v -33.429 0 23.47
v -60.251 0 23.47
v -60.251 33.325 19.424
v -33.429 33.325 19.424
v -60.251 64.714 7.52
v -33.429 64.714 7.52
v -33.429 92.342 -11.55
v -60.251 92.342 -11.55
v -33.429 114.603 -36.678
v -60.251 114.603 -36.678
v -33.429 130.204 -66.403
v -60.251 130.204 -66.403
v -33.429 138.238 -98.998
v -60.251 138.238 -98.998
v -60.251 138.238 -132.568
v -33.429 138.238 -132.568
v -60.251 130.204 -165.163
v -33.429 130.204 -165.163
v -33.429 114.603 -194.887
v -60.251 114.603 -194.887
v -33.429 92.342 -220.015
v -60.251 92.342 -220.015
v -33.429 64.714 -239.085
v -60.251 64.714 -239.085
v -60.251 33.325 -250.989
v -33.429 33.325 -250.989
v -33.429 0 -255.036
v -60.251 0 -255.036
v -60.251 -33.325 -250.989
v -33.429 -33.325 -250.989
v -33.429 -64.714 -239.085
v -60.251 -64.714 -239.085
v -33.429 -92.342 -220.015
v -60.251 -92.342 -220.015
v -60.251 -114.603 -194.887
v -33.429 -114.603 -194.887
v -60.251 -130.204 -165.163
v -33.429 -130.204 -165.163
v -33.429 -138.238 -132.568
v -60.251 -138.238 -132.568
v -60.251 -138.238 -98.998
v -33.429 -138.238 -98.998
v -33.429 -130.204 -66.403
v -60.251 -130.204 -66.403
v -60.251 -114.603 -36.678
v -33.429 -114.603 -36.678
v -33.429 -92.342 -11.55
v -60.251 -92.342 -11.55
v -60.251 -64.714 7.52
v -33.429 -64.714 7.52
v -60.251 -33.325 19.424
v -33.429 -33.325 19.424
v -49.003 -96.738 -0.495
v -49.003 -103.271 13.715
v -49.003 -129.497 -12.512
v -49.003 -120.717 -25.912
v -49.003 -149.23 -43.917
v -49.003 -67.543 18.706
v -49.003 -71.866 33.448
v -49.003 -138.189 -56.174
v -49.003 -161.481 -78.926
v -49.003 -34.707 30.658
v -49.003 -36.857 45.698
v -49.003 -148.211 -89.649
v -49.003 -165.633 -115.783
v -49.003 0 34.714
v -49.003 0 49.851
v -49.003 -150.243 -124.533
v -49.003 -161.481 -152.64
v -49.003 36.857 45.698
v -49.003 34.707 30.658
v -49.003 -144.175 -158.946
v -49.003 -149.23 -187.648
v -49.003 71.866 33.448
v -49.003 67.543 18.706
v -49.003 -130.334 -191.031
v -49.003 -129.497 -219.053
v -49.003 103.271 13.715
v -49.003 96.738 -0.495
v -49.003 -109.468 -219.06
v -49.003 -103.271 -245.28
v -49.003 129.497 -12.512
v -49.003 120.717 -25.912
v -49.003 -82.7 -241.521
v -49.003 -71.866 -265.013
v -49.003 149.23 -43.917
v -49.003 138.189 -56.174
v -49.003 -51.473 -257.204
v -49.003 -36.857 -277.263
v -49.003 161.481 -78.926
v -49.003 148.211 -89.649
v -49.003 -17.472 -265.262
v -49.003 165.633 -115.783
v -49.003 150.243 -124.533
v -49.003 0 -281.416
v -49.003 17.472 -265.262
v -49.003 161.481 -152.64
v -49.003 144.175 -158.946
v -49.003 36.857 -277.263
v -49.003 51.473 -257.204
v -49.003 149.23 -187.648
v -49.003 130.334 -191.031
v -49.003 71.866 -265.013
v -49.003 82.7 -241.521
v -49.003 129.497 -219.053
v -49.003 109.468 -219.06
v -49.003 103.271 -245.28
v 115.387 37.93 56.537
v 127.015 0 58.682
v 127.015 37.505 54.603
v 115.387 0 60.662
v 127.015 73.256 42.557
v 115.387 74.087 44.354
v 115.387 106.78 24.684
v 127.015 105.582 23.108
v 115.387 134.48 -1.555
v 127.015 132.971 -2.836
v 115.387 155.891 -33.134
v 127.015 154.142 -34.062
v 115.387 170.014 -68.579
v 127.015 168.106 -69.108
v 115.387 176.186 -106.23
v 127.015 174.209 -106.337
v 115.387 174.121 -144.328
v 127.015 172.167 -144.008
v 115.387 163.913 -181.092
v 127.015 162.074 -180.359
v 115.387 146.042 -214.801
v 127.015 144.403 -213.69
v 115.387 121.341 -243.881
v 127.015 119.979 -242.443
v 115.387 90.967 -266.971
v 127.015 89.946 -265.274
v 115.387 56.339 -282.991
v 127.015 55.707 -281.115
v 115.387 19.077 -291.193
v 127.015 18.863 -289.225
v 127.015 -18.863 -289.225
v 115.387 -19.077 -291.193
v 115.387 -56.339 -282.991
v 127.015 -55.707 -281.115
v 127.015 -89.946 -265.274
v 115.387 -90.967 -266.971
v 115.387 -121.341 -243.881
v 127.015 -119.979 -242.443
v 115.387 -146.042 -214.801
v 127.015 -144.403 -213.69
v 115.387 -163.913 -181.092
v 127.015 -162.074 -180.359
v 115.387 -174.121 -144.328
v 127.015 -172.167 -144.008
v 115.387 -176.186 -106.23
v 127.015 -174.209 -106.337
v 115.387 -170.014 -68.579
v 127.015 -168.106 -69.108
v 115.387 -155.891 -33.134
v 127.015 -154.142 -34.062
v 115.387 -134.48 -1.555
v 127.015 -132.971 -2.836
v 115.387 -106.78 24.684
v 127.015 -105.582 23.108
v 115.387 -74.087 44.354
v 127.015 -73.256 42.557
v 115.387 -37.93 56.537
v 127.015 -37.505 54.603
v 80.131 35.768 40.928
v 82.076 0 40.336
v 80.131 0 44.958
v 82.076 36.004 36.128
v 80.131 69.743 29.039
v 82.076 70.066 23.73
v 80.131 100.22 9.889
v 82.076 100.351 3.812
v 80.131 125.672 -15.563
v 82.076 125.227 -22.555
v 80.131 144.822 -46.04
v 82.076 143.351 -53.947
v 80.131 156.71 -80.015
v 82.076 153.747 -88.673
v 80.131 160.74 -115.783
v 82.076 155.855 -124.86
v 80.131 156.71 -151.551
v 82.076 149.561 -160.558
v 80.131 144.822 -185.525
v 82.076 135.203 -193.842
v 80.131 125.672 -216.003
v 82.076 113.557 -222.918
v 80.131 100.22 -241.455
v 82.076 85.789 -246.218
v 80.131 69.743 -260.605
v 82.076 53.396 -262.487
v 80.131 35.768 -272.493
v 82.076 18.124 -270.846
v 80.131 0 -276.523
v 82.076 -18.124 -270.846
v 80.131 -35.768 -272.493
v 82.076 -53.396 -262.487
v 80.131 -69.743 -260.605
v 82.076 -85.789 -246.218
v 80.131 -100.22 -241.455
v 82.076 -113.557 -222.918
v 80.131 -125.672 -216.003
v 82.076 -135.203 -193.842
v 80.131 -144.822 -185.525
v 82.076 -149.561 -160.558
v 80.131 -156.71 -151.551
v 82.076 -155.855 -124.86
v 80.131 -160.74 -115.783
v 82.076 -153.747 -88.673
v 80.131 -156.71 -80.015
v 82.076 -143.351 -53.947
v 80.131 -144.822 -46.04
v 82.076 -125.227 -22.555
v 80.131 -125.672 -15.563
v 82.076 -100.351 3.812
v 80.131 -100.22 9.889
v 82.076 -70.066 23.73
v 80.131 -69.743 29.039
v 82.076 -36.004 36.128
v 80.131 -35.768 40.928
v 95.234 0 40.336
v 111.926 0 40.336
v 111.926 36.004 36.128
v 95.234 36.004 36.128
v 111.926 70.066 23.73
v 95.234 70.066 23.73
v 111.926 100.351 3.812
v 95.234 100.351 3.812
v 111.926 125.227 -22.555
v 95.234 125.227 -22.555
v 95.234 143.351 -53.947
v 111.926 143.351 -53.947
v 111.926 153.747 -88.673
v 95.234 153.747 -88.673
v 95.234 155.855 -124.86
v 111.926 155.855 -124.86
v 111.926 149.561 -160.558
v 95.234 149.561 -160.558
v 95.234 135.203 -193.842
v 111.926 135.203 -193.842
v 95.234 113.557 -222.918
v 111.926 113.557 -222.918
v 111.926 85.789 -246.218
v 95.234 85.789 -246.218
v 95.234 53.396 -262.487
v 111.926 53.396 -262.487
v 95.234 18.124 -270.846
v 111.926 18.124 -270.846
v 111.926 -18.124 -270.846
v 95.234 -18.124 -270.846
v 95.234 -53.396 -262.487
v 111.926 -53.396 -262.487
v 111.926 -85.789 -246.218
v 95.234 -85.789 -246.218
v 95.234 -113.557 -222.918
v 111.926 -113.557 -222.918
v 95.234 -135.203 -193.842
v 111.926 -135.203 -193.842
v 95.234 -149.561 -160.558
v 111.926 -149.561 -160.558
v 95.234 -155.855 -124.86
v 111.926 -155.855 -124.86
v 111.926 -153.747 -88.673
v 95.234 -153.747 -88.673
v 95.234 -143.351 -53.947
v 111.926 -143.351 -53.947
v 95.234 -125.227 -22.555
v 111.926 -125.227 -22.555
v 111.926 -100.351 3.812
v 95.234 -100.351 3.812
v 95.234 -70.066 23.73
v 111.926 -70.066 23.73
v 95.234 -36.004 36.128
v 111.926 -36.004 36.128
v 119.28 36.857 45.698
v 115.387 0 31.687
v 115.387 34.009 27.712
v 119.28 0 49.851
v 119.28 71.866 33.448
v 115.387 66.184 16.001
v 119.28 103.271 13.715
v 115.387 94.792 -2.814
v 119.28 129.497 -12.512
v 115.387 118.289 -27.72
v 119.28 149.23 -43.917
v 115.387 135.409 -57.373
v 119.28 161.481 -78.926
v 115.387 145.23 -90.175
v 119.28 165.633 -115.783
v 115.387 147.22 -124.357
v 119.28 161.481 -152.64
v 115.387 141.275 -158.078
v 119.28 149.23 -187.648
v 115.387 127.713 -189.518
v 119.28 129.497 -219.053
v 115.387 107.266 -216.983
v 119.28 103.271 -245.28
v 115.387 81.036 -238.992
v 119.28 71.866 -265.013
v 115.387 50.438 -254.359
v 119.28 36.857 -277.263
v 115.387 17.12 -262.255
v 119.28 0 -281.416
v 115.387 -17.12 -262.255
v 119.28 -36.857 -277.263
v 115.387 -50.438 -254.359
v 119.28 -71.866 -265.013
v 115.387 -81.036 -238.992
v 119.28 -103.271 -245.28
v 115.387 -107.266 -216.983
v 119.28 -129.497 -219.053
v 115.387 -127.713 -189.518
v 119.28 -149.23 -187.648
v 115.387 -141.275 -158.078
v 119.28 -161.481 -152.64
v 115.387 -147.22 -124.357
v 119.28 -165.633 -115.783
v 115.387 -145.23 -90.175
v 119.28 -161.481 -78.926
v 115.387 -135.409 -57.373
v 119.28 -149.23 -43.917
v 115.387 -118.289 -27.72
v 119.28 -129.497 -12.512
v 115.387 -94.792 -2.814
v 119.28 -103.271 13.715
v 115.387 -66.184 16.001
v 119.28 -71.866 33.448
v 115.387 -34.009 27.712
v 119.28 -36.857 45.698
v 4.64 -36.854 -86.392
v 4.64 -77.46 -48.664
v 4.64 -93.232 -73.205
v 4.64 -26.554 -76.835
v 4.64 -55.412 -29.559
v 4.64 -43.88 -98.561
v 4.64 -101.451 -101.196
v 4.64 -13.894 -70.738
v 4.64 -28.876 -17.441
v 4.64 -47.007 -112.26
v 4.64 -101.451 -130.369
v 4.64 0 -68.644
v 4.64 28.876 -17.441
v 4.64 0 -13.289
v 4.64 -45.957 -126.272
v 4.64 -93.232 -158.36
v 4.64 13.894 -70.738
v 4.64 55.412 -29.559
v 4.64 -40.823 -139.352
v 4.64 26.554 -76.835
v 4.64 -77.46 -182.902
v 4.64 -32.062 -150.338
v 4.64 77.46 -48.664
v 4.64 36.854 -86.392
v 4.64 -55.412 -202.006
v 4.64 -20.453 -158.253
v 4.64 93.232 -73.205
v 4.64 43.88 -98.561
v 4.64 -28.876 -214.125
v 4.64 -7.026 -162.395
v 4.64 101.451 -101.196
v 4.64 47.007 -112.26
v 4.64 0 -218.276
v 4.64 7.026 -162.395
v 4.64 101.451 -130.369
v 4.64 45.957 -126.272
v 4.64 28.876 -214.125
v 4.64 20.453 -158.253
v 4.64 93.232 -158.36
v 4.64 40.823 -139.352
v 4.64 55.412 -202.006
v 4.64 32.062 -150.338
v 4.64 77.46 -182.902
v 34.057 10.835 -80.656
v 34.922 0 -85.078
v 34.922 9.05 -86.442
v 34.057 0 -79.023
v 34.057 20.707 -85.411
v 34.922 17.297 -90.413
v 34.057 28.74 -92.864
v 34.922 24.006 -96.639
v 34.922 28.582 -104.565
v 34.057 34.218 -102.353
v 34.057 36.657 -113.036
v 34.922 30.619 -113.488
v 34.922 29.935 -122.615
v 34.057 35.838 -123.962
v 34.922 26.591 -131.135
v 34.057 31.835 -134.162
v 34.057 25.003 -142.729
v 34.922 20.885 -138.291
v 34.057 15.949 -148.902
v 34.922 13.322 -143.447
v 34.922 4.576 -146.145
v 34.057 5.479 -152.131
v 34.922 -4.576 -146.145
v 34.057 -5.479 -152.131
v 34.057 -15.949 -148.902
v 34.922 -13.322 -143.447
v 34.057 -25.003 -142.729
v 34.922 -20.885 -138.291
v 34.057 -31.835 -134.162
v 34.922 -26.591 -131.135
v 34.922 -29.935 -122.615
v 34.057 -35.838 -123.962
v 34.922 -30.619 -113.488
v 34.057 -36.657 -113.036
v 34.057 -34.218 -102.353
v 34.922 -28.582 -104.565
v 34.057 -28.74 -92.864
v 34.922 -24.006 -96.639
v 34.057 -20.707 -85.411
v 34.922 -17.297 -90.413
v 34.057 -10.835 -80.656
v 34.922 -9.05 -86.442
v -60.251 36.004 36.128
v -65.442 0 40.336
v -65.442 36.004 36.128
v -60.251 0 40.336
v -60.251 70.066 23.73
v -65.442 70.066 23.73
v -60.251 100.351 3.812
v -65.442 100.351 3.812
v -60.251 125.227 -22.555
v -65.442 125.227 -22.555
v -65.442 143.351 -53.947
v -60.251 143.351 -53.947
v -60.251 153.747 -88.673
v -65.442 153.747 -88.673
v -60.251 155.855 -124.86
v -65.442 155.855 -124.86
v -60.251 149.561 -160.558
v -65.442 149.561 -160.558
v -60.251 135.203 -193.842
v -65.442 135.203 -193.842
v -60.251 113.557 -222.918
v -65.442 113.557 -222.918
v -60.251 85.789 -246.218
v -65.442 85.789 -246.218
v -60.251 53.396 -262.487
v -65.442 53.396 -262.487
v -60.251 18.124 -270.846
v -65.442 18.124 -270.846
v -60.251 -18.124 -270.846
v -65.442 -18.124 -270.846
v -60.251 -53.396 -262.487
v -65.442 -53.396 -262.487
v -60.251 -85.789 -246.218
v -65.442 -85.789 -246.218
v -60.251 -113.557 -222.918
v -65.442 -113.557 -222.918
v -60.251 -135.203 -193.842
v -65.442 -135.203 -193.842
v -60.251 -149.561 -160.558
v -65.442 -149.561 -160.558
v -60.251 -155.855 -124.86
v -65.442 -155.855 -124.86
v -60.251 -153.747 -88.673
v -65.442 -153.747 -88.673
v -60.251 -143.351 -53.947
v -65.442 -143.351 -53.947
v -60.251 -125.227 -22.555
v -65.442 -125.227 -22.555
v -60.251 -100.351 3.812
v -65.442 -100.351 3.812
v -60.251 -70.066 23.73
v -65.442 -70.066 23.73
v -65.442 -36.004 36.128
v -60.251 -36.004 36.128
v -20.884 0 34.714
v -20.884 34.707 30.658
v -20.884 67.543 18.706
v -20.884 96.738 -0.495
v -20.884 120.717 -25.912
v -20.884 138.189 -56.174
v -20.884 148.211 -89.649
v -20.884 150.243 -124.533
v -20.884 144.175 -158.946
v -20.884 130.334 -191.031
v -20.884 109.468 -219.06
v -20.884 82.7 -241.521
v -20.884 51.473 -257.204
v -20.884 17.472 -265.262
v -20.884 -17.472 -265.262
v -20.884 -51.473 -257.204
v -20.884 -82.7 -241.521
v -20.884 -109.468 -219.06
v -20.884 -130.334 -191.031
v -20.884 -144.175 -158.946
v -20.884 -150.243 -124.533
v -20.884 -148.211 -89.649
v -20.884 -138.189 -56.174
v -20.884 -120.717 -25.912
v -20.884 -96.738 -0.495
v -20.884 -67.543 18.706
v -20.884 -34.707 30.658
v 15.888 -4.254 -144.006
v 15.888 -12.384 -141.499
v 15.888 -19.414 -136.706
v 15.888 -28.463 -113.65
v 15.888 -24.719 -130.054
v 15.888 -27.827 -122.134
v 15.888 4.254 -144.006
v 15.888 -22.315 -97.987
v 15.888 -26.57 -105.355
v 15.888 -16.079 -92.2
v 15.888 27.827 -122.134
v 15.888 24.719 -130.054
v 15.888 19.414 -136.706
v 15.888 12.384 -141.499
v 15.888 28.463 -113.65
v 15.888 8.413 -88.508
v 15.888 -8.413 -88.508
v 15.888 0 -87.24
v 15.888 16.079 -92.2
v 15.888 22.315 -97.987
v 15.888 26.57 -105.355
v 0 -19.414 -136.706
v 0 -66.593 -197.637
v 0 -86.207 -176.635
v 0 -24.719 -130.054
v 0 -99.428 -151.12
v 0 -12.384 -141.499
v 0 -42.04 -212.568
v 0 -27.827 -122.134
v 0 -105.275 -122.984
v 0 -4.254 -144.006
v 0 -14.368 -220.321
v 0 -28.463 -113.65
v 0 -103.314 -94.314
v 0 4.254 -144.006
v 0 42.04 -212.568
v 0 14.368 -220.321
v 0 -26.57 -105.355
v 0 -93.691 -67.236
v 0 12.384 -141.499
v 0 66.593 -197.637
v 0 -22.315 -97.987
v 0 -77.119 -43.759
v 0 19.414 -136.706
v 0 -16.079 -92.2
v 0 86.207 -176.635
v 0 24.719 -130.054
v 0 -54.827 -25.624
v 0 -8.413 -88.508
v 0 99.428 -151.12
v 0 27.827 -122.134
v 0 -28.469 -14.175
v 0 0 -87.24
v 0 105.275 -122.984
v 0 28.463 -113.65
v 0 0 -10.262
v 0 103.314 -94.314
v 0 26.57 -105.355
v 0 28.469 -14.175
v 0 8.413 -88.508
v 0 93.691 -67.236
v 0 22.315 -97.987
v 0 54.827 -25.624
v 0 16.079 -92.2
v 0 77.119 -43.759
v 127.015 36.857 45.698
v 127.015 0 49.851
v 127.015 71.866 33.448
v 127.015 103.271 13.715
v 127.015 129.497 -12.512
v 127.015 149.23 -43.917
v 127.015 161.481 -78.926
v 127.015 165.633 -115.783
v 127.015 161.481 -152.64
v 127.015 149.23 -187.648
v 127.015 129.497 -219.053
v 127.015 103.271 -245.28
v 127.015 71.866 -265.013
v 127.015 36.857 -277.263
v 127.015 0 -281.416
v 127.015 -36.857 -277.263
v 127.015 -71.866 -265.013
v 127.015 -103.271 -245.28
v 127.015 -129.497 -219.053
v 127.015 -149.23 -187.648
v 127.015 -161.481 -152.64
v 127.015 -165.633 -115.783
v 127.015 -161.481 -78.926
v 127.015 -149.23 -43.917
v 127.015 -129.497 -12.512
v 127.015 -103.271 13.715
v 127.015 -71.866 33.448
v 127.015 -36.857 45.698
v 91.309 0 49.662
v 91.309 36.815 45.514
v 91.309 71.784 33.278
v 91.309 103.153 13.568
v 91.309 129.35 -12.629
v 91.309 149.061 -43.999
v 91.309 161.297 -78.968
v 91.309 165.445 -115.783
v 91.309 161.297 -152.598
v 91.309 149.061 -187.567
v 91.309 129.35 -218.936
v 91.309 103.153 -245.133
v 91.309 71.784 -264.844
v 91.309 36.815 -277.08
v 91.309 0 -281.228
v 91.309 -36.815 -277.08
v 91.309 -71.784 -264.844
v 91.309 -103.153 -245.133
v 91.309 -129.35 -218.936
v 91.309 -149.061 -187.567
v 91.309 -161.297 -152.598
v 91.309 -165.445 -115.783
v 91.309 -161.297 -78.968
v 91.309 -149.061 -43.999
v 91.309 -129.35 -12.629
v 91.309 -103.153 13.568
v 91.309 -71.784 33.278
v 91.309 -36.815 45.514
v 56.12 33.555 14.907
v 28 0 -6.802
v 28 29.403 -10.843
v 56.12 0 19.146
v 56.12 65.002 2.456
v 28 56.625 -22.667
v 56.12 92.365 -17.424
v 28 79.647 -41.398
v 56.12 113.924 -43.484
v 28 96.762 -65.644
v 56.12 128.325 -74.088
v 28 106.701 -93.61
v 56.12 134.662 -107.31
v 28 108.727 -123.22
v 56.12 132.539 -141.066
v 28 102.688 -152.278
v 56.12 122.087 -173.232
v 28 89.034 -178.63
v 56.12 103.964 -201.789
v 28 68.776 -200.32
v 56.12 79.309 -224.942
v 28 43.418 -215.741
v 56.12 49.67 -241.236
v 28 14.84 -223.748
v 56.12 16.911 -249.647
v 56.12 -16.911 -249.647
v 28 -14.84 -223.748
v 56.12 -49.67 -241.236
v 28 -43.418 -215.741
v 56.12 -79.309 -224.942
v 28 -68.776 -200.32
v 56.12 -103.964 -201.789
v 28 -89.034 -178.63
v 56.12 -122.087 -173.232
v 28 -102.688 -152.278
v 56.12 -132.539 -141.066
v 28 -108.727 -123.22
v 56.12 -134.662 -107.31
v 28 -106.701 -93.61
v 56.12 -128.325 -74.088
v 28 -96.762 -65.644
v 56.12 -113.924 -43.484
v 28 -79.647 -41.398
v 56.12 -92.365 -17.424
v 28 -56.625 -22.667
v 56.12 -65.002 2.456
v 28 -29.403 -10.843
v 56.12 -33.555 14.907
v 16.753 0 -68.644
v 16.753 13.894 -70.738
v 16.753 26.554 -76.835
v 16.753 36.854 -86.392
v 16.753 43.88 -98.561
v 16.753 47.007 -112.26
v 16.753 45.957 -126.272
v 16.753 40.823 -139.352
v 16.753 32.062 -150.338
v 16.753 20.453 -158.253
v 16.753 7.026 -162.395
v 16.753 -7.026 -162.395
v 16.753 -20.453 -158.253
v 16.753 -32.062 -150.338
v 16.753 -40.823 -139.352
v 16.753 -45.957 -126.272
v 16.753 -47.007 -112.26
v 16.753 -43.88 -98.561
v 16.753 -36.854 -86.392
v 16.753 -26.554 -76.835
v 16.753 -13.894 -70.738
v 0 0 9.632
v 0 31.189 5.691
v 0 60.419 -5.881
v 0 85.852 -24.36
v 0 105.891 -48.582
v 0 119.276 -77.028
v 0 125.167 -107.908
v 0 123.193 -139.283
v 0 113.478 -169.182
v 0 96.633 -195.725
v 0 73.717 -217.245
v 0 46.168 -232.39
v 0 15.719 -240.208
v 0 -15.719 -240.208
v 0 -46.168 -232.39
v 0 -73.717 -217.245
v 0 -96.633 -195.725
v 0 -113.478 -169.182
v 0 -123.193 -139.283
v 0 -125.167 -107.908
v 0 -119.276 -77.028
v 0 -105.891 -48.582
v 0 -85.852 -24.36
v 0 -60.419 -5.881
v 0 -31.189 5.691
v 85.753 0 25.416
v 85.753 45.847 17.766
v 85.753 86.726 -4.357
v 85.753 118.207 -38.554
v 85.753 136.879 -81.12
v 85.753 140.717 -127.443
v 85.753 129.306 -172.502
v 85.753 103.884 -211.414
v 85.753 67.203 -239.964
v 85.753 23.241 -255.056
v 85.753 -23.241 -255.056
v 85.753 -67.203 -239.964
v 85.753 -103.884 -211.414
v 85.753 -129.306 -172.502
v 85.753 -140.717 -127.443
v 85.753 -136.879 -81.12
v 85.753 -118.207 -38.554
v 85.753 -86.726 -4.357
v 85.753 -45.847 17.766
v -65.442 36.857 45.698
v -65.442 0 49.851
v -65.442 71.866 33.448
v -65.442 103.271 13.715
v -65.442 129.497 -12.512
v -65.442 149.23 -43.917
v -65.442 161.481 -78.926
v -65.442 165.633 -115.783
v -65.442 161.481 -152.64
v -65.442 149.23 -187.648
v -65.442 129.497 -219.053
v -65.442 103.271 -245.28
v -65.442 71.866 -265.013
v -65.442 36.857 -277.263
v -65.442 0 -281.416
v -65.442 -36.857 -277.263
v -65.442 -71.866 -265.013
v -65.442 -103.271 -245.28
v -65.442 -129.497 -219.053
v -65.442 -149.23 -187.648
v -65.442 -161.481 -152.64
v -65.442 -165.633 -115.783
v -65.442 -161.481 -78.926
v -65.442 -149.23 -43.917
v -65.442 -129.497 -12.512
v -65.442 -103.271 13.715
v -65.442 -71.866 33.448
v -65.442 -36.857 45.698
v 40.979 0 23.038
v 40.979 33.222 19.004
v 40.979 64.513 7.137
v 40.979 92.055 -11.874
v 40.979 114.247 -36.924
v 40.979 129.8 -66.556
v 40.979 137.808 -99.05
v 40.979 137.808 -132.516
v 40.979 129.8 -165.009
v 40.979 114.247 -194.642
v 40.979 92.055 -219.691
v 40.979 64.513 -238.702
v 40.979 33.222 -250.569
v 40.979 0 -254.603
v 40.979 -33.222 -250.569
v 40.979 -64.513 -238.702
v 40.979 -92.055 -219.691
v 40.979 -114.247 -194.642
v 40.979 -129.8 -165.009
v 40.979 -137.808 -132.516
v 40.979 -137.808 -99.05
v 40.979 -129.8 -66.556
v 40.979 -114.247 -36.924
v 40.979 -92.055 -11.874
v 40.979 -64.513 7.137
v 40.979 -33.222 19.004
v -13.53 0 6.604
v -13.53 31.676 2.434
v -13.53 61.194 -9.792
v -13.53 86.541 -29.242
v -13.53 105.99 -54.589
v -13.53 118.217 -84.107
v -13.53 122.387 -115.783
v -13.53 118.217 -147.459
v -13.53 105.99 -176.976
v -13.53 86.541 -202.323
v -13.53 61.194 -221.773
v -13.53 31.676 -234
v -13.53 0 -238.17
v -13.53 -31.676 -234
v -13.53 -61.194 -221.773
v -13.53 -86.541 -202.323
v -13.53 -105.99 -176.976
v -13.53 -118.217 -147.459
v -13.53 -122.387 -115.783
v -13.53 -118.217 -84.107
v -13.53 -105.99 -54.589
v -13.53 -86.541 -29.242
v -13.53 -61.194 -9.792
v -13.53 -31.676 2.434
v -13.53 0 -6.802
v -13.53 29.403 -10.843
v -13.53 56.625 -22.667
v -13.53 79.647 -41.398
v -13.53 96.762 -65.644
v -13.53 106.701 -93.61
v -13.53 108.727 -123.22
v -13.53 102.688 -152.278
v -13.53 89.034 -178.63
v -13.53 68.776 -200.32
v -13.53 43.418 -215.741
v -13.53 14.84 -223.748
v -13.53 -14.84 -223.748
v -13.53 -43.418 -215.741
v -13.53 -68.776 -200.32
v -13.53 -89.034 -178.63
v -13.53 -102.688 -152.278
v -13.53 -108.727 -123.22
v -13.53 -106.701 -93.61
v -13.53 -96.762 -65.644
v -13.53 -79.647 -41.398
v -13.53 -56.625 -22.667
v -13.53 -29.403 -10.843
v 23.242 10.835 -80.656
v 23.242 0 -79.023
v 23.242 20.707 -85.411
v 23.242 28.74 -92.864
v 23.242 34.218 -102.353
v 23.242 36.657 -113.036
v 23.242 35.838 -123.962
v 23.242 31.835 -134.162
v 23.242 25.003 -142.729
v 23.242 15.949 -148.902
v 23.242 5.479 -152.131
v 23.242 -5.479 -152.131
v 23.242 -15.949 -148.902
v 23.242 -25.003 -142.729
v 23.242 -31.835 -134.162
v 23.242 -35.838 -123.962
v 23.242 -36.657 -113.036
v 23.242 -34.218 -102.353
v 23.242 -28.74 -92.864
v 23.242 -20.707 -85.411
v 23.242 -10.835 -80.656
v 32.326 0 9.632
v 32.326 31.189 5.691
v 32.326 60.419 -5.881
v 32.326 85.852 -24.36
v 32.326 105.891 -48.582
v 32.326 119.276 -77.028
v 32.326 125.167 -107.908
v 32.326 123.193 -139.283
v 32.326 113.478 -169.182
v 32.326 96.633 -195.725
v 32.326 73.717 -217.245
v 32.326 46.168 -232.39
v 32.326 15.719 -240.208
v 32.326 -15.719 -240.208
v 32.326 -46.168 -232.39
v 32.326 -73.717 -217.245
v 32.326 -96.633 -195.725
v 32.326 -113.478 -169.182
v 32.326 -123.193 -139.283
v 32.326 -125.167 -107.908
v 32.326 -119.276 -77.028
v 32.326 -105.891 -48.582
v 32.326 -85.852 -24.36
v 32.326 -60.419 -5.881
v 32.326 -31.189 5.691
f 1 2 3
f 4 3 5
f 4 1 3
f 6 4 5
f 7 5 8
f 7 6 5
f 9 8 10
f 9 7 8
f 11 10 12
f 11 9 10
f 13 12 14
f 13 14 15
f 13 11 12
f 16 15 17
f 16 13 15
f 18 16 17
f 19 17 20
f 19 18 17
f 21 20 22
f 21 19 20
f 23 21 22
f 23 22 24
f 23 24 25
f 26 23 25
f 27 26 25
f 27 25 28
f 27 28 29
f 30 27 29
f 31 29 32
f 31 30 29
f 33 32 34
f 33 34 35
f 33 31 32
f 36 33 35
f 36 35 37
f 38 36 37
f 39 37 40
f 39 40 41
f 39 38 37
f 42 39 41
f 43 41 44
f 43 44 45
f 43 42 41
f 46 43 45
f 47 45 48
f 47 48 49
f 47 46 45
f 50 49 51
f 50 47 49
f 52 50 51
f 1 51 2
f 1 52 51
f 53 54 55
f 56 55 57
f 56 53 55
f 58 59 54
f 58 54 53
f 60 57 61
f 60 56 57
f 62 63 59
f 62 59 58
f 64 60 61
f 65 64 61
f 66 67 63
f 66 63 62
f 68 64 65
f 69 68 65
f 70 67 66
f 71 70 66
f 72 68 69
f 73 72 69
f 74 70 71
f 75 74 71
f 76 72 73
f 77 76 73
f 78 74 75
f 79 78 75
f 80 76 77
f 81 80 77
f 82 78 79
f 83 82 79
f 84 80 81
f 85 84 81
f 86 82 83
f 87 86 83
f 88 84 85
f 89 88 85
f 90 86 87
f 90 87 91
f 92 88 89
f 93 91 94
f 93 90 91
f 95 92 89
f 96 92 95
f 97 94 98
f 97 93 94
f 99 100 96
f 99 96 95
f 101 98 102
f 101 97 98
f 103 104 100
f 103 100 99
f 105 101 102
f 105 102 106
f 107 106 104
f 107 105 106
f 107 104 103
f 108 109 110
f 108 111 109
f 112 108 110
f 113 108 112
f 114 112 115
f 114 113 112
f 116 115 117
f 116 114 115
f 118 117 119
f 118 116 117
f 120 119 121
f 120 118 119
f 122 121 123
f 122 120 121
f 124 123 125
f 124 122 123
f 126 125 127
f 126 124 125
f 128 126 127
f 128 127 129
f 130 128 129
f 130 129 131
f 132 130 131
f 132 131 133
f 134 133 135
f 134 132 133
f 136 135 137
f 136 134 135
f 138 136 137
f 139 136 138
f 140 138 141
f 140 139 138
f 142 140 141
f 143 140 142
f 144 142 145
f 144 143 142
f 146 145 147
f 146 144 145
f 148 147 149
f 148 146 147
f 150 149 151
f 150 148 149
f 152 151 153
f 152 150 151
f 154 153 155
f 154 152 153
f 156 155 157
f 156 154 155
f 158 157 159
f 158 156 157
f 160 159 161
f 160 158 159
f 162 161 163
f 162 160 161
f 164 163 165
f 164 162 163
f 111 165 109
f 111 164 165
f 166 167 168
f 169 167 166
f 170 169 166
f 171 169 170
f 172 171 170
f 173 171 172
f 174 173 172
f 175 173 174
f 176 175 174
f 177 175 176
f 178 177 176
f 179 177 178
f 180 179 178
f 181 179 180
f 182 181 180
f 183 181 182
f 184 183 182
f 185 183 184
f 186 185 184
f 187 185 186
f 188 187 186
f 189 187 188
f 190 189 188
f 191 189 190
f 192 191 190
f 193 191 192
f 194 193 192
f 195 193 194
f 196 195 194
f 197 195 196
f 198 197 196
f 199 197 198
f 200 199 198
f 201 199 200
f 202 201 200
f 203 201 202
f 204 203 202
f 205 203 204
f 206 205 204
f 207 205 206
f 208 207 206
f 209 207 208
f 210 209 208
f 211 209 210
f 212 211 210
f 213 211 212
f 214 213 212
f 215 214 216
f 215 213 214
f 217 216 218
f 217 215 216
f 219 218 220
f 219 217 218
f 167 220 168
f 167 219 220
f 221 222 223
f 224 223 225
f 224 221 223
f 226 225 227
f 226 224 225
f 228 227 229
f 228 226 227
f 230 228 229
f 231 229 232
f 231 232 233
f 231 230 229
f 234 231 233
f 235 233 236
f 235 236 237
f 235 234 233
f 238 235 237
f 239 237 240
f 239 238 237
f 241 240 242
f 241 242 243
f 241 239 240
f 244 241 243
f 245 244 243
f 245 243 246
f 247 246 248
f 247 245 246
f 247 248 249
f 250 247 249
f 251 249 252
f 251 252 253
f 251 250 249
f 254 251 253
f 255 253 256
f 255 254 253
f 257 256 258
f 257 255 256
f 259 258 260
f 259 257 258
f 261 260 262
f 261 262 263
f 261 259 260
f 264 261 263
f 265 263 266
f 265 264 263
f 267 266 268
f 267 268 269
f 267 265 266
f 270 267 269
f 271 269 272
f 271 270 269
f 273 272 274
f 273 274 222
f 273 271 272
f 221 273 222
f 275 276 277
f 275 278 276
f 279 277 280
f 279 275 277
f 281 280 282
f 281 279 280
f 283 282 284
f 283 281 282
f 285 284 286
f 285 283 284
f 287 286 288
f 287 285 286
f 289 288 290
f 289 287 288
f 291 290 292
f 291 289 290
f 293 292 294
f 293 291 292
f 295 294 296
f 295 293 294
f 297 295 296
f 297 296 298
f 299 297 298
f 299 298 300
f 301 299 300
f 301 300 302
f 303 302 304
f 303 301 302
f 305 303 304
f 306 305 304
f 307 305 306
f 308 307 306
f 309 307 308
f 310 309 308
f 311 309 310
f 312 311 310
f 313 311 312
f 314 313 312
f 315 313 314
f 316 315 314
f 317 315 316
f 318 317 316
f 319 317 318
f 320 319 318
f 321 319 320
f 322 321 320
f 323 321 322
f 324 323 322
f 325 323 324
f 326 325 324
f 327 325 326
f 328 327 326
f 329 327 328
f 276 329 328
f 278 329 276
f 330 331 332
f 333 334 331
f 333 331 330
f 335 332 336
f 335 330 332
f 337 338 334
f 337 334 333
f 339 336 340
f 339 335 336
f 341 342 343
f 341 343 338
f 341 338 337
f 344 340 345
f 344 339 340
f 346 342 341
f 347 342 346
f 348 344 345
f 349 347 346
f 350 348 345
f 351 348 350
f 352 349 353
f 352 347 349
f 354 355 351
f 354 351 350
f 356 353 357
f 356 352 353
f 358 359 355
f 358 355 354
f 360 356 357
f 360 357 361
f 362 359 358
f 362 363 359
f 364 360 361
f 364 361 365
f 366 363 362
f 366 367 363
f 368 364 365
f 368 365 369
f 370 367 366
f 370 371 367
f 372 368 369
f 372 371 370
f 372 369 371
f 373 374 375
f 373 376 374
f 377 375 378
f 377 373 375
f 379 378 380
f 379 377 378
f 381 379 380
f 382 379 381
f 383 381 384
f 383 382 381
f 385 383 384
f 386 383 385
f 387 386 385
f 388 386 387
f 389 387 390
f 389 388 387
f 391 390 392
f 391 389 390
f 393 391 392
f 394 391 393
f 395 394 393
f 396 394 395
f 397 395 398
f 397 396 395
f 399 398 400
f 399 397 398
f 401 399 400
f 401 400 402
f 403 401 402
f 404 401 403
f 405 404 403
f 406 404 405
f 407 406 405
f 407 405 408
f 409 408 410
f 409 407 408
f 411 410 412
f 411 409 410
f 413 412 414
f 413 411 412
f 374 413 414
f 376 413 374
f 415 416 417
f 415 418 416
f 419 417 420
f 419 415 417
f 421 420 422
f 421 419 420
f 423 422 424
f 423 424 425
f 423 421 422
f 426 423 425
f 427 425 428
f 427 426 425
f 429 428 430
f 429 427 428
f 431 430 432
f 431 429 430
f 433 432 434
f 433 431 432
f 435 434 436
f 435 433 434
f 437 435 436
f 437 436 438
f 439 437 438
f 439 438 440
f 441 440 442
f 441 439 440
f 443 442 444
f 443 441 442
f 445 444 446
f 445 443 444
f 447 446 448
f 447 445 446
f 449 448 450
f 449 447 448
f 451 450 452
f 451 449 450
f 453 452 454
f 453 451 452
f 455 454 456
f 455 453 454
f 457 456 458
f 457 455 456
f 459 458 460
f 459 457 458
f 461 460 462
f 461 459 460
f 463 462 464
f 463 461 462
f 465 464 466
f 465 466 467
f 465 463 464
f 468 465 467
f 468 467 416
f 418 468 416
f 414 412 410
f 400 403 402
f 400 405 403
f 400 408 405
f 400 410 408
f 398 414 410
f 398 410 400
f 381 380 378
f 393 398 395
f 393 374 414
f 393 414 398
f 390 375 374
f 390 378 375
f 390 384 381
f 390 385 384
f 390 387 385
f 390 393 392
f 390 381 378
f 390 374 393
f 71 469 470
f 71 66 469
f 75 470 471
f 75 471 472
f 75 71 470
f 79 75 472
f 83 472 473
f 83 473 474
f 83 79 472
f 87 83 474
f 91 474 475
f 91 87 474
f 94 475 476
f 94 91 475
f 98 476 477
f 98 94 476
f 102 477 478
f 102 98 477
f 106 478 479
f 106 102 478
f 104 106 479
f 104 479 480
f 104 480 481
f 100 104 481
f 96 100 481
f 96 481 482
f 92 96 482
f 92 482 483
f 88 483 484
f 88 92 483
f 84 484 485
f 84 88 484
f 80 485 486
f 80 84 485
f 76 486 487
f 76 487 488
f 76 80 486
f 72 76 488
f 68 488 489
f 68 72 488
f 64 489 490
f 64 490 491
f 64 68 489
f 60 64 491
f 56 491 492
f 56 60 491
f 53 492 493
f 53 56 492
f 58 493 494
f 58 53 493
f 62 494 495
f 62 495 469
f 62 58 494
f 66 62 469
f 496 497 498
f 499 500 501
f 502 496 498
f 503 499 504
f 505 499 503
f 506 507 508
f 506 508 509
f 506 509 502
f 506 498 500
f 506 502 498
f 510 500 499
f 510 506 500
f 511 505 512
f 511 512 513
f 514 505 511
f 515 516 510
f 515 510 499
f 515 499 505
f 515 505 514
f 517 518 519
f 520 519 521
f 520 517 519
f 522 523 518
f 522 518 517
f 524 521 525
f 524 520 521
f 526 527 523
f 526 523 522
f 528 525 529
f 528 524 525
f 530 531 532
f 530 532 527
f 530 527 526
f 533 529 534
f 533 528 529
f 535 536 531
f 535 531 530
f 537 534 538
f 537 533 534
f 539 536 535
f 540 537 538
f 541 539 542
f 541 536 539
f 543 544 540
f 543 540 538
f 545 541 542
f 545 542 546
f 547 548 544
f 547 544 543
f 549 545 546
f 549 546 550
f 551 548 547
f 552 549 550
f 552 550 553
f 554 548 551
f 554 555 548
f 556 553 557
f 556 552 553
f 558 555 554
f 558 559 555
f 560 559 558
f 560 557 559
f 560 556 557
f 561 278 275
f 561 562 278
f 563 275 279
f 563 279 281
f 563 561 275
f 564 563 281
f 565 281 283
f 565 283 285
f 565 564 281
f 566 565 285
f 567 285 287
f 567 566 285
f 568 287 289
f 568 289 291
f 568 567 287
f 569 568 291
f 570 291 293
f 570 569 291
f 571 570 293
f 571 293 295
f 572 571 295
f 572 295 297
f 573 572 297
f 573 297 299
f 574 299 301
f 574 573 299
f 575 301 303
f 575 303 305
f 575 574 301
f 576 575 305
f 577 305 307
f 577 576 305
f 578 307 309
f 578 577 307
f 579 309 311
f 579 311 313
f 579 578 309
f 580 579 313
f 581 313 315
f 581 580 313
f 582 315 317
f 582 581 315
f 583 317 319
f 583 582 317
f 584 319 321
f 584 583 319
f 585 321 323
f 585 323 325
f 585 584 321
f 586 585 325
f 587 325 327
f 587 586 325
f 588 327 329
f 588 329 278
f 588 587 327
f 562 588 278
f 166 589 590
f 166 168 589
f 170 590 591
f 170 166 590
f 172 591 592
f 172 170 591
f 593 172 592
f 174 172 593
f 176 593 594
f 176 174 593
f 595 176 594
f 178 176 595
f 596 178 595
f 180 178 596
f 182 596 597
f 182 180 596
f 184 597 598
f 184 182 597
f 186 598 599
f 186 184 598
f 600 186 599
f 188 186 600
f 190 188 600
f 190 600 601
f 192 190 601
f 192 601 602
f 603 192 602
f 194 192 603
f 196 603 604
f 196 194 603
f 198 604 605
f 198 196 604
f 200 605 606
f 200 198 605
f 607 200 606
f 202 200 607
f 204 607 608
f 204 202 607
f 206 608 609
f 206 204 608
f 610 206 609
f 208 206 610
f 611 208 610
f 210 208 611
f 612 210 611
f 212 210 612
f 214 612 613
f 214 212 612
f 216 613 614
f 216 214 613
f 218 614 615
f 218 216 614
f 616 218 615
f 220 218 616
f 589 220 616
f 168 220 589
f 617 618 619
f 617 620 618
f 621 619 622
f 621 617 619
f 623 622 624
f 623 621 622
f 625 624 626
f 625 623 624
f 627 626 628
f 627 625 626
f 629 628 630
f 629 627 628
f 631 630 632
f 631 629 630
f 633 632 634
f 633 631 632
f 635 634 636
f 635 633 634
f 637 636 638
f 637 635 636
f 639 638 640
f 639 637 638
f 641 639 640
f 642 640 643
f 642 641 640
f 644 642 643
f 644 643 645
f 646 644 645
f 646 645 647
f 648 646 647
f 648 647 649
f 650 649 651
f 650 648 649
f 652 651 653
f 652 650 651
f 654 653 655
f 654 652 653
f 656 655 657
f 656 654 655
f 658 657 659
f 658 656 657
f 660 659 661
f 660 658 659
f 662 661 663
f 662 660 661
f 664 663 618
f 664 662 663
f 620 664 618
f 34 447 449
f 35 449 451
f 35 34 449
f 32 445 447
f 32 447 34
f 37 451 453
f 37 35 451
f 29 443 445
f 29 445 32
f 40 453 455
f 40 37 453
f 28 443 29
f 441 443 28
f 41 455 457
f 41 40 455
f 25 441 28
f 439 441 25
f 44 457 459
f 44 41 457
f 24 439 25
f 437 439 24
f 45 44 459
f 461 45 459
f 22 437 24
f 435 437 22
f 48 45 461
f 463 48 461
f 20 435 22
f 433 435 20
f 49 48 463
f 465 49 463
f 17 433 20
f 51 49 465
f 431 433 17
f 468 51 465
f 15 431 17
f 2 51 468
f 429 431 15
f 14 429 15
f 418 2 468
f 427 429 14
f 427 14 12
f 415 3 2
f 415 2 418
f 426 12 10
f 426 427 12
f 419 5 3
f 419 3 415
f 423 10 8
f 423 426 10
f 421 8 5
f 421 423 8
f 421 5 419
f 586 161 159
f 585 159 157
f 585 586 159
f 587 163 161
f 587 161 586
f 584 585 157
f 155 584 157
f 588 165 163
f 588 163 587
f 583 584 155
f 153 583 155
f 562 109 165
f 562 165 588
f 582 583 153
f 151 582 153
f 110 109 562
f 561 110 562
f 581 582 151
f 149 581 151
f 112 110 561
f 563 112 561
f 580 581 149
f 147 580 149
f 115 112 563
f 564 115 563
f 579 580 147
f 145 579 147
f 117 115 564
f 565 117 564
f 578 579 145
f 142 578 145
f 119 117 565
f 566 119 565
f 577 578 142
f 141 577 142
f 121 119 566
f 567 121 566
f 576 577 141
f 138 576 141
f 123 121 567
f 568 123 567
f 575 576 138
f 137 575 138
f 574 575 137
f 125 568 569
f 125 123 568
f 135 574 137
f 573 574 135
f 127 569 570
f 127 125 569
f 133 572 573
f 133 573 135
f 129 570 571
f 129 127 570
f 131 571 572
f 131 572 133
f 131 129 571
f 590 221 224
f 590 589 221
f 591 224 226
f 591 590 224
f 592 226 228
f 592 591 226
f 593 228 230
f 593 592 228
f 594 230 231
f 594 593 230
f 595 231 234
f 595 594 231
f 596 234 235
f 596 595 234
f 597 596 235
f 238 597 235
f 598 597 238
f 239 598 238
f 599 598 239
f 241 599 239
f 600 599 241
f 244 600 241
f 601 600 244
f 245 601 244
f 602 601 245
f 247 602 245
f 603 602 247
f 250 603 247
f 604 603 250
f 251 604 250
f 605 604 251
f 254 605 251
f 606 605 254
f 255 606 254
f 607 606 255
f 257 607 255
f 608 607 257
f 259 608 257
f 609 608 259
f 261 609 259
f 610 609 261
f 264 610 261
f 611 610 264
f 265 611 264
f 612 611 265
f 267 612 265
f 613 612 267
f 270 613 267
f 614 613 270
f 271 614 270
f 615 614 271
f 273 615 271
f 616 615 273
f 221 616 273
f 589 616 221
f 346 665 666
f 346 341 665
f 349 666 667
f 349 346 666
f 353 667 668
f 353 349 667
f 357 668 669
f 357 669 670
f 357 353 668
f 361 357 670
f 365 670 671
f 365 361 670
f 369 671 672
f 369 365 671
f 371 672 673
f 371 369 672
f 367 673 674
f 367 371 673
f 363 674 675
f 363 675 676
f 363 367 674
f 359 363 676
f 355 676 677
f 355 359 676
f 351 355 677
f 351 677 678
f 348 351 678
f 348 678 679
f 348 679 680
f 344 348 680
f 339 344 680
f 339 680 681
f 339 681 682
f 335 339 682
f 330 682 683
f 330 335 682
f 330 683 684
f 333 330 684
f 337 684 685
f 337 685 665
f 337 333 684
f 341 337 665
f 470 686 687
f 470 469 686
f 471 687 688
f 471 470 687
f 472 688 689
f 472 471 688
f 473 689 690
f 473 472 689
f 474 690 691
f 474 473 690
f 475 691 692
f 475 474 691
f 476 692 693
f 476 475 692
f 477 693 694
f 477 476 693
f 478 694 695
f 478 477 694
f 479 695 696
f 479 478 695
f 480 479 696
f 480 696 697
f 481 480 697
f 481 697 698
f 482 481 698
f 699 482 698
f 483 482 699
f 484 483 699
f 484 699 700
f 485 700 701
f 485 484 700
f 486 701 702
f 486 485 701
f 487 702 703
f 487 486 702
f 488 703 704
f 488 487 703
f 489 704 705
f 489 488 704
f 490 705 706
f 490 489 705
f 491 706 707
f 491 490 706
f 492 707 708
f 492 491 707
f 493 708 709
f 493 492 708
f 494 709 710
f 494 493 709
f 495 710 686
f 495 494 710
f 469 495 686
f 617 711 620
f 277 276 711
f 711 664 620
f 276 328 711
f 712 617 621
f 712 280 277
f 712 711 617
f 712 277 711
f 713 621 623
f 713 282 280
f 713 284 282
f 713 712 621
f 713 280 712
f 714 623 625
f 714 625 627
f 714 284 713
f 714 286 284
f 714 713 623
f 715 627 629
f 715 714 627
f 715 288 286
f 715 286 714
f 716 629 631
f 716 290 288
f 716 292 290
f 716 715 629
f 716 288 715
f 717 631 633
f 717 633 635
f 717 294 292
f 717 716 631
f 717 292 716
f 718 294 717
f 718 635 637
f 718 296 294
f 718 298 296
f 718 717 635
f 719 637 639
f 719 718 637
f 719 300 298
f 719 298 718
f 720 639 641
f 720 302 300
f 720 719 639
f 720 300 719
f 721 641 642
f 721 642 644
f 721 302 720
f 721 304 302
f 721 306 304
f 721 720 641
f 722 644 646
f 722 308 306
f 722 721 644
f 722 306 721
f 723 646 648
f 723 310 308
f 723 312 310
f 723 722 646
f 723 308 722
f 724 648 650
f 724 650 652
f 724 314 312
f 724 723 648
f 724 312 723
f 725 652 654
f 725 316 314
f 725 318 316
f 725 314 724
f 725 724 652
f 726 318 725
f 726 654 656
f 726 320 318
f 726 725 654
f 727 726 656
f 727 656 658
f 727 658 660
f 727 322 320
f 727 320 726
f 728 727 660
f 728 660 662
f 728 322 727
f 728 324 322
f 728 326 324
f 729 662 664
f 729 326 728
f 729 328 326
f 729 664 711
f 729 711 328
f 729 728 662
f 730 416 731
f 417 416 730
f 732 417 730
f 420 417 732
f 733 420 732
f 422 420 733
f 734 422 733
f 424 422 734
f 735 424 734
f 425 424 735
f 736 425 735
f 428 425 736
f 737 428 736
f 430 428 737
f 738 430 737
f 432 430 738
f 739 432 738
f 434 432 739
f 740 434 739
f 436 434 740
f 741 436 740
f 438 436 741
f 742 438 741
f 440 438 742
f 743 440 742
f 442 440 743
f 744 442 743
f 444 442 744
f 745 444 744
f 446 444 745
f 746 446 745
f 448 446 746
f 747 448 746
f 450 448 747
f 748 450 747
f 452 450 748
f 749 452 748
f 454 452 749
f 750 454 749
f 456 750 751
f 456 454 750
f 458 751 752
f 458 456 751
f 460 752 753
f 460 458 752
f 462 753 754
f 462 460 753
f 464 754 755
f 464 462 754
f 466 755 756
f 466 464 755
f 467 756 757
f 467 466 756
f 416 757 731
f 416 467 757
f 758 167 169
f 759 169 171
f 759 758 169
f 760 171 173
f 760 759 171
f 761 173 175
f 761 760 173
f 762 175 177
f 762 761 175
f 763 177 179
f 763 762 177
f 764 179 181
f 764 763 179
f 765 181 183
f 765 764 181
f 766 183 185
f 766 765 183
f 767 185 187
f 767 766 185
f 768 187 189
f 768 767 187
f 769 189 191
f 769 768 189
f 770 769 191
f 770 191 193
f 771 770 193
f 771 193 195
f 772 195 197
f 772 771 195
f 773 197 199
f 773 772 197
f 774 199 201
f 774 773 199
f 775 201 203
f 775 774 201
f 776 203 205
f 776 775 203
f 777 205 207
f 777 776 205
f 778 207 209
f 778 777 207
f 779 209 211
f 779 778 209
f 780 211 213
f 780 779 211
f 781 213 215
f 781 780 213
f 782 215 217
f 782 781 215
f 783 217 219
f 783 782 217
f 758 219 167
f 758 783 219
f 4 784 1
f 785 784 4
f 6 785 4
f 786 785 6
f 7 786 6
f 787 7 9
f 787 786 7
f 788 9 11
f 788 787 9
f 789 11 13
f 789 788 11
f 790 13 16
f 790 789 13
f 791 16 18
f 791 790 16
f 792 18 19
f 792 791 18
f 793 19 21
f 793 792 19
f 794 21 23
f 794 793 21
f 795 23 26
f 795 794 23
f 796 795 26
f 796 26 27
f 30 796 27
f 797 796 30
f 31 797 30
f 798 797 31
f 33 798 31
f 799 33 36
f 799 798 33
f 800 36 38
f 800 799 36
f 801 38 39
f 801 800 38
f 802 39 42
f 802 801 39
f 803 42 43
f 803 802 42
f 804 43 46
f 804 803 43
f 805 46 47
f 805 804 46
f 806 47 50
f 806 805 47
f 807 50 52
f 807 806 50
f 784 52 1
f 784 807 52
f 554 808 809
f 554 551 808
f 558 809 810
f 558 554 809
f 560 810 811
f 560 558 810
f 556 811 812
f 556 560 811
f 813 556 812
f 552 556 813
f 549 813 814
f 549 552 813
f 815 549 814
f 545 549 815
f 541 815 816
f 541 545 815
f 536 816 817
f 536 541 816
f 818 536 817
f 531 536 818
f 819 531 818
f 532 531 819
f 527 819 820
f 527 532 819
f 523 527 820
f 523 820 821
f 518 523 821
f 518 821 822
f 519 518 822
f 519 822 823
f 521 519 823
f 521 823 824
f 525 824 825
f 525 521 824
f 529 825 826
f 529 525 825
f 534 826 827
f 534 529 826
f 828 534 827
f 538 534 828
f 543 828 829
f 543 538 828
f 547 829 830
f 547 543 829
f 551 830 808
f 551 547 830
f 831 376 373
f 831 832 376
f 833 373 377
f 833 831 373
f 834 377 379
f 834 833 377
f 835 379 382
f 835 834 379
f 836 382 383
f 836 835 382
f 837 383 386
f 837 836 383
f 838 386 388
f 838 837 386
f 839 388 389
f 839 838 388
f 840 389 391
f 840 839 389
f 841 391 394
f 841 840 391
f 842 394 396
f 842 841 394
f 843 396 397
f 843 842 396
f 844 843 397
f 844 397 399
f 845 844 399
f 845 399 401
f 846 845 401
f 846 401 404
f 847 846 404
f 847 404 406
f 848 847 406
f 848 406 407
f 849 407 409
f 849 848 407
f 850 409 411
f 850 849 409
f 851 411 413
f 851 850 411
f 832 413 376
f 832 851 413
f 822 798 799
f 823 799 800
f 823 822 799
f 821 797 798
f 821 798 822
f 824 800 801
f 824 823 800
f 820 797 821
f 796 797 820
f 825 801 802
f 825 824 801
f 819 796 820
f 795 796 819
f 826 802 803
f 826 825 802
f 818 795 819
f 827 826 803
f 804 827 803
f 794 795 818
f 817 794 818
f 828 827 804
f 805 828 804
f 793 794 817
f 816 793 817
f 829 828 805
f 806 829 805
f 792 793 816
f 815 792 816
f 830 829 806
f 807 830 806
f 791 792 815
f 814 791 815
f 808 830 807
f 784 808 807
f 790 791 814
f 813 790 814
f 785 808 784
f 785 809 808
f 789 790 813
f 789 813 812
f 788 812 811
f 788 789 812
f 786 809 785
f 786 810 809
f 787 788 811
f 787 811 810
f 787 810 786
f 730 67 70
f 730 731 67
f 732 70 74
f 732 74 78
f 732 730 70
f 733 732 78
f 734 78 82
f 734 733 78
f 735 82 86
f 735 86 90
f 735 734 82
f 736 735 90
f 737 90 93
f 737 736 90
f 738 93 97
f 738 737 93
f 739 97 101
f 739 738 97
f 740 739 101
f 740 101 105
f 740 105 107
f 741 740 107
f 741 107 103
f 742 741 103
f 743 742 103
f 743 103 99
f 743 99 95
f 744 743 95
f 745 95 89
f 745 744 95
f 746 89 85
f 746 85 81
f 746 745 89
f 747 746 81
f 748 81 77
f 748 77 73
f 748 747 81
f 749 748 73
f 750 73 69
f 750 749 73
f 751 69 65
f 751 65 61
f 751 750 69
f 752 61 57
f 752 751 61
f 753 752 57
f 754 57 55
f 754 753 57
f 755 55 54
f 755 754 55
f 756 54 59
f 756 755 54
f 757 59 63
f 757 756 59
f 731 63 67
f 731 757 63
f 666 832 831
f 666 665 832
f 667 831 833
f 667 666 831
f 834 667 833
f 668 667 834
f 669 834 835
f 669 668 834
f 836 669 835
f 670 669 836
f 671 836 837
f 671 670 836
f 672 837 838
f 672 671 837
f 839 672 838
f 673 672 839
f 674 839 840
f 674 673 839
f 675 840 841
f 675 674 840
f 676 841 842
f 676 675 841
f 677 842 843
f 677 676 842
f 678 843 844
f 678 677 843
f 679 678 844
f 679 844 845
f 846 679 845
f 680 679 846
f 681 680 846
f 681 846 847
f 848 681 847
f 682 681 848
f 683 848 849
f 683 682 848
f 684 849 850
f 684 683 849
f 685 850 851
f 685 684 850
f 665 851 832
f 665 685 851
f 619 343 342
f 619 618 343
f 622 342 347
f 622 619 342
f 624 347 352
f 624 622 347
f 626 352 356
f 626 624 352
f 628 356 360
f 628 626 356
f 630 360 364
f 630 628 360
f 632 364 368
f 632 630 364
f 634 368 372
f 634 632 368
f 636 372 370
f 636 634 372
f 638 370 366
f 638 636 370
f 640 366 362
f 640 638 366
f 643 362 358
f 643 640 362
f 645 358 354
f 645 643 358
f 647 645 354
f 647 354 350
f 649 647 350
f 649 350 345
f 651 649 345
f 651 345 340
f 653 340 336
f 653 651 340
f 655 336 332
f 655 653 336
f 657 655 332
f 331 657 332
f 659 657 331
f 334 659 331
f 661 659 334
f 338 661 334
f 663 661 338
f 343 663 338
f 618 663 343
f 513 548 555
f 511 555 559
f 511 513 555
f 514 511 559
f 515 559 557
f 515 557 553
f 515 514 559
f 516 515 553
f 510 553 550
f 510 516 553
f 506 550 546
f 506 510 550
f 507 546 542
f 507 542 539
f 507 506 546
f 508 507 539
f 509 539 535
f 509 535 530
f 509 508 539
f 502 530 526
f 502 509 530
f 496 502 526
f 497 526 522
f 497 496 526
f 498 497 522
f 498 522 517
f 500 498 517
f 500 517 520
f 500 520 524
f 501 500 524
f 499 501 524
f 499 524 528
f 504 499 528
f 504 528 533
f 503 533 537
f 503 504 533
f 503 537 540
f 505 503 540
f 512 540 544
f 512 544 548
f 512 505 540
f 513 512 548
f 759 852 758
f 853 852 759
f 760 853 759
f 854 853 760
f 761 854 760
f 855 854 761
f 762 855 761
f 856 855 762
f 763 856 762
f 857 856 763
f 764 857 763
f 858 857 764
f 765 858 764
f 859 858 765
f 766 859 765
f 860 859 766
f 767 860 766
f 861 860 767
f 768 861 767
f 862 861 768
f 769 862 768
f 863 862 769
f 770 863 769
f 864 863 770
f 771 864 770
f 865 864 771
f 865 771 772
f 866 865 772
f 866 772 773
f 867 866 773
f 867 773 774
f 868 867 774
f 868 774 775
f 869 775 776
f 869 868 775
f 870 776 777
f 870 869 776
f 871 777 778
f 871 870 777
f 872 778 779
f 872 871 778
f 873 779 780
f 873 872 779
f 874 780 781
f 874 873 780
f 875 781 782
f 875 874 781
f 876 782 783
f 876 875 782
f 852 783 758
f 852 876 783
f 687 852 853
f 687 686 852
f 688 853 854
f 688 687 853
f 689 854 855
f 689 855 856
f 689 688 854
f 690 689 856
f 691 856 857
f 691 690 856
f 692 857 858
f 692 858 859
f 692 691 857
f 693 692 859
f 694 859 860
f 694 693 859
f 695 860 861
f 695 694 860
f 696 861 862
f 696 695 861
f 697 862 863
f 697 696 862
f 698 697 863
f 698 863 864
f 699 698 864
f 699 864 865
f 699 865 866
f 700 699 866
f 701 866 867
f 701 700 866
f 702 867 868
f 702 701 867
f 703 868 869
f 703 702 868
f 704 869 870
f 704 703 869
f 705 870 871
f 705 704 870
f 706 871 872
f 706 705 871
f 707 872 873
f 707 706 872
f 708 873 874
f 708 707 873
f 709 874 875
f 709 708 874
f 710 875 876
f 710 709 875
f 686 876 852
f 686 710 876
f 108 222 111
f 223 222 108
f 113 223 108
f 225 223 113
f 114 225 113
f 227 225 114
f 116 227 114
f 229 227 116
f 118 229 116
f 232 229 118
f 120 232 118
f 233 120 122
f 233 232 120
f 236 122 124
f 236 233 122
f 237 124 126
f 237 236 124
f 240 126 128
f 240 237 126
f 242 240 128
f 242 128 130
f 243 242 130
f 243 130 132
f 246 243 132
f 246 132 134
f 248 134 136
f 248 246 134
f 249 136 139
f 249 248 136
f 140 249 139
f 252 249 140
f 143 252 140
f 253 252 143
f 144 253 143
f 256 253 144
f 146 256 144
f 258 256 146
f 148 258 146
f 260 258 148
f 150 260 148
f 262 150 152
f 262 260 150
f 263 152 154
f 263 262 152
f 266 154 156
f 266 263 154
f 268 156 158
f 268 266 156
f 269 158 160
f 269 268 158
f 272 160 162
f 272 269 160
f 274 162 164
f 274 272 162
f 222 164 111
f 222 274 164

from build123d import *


with BuildPart() as f1:
    # F0 (on Front) → F1 (revolve)
    with BuildSketch(Plane.XZ):
        Polygon((-5.5380323902, 50.2795092762), (-30.604917556, 50.2795092762), (-46.0446093346, 54.9755878761), (-54.0652101429, 53.2870396276), (-56.2547557056, 63.687376678), (-67.3308223486, 61.3555721939), (-67.3308223486, 55.2345886827), (-62.3757392168, 55.2345886827), (-62.3757392168, 46.4903302491), (-37.6003272831, 39.7863946855), (-37.6003272831, 25.212623179), (-29.4390171766, 11.5132788196), (-29.4390171766, -6.8496726453), (-20.9862291813, -20.2575419098), (2.331804717, -12.0962299407), (11.3675408065, -29.8762302846), (31.1878658831, -23.4637726098), (18.0714763701, -13.5536063462), (22.1521314234, 11.2218027934), (36.7259047925, 29.8762302846), (36.7259047925, 45.3244261444), (9.9101634696, 49.4050830603), (-5.5380323902, 46.4903302491), align=None)
    revolve(axis=Axis((21.2777033448, 0, -26.6700014472), (-0.9514445247, 0, -0.3078202664)))


with BuildPart() as f4:
    # F3 (on Front) → F4 (revolve)
    with BuildSketch(Plane.XZ):
        Polygon((-49.0032210946, 49.8506426811), (-65.442211926, 49.8506426811), (-65.4422044754, 40.3364561498), (-60.2509491146, 40.3364561498), (-60.2509491146, 23.4703980386), (-33.4294438362, 23.4703980386), (-13.5296229273, 6.6043394618), (-13.5296229273, -6.8020136096), (0, -10.2617200464), (0, -87.2401446104), (15.8875081688, -87.2401446104), (15.8875081688, -115.782700479), (34.9221229553, -115.782700479), (34.9221229553, -85.077829659), (34.0569131076, -79.0233463049), (23.2417937368, -79.0233463049), (16.7527180165, -68.644233048), (4.6397843398, -68.644233048), (4.6397843398, -13.2889607921), (28.0004460365, -6.8020136096), (56.1197660863, 19.1457699984), (115.3866276145, 31.6872000694), (119.280077517, 49.8506426811), (127.0151686524, 49.8506426811), (127.0151686524, 58.6822458537), (115.3866276145, 60.6622211635), (111.9257882237, 40.3364561498), (95.2339635486, 40.3364561498), (91.3085111252, 49.6624633169), (80.1309212987, 44.9576527494), (82.0760503411, 40.3364561498), (40.9785918891, 23.0379365385), (32.3264971375, 9.6315825358), (0, 9.6315825358), (-20.88390477, 34.7144380212), (-49.0032210946, 34.7144380212), align=None)
    revolve(axis=Axis((25.4048155621, 0, -115.782700479), (-1, 0, 0)))


solid = f4.part
